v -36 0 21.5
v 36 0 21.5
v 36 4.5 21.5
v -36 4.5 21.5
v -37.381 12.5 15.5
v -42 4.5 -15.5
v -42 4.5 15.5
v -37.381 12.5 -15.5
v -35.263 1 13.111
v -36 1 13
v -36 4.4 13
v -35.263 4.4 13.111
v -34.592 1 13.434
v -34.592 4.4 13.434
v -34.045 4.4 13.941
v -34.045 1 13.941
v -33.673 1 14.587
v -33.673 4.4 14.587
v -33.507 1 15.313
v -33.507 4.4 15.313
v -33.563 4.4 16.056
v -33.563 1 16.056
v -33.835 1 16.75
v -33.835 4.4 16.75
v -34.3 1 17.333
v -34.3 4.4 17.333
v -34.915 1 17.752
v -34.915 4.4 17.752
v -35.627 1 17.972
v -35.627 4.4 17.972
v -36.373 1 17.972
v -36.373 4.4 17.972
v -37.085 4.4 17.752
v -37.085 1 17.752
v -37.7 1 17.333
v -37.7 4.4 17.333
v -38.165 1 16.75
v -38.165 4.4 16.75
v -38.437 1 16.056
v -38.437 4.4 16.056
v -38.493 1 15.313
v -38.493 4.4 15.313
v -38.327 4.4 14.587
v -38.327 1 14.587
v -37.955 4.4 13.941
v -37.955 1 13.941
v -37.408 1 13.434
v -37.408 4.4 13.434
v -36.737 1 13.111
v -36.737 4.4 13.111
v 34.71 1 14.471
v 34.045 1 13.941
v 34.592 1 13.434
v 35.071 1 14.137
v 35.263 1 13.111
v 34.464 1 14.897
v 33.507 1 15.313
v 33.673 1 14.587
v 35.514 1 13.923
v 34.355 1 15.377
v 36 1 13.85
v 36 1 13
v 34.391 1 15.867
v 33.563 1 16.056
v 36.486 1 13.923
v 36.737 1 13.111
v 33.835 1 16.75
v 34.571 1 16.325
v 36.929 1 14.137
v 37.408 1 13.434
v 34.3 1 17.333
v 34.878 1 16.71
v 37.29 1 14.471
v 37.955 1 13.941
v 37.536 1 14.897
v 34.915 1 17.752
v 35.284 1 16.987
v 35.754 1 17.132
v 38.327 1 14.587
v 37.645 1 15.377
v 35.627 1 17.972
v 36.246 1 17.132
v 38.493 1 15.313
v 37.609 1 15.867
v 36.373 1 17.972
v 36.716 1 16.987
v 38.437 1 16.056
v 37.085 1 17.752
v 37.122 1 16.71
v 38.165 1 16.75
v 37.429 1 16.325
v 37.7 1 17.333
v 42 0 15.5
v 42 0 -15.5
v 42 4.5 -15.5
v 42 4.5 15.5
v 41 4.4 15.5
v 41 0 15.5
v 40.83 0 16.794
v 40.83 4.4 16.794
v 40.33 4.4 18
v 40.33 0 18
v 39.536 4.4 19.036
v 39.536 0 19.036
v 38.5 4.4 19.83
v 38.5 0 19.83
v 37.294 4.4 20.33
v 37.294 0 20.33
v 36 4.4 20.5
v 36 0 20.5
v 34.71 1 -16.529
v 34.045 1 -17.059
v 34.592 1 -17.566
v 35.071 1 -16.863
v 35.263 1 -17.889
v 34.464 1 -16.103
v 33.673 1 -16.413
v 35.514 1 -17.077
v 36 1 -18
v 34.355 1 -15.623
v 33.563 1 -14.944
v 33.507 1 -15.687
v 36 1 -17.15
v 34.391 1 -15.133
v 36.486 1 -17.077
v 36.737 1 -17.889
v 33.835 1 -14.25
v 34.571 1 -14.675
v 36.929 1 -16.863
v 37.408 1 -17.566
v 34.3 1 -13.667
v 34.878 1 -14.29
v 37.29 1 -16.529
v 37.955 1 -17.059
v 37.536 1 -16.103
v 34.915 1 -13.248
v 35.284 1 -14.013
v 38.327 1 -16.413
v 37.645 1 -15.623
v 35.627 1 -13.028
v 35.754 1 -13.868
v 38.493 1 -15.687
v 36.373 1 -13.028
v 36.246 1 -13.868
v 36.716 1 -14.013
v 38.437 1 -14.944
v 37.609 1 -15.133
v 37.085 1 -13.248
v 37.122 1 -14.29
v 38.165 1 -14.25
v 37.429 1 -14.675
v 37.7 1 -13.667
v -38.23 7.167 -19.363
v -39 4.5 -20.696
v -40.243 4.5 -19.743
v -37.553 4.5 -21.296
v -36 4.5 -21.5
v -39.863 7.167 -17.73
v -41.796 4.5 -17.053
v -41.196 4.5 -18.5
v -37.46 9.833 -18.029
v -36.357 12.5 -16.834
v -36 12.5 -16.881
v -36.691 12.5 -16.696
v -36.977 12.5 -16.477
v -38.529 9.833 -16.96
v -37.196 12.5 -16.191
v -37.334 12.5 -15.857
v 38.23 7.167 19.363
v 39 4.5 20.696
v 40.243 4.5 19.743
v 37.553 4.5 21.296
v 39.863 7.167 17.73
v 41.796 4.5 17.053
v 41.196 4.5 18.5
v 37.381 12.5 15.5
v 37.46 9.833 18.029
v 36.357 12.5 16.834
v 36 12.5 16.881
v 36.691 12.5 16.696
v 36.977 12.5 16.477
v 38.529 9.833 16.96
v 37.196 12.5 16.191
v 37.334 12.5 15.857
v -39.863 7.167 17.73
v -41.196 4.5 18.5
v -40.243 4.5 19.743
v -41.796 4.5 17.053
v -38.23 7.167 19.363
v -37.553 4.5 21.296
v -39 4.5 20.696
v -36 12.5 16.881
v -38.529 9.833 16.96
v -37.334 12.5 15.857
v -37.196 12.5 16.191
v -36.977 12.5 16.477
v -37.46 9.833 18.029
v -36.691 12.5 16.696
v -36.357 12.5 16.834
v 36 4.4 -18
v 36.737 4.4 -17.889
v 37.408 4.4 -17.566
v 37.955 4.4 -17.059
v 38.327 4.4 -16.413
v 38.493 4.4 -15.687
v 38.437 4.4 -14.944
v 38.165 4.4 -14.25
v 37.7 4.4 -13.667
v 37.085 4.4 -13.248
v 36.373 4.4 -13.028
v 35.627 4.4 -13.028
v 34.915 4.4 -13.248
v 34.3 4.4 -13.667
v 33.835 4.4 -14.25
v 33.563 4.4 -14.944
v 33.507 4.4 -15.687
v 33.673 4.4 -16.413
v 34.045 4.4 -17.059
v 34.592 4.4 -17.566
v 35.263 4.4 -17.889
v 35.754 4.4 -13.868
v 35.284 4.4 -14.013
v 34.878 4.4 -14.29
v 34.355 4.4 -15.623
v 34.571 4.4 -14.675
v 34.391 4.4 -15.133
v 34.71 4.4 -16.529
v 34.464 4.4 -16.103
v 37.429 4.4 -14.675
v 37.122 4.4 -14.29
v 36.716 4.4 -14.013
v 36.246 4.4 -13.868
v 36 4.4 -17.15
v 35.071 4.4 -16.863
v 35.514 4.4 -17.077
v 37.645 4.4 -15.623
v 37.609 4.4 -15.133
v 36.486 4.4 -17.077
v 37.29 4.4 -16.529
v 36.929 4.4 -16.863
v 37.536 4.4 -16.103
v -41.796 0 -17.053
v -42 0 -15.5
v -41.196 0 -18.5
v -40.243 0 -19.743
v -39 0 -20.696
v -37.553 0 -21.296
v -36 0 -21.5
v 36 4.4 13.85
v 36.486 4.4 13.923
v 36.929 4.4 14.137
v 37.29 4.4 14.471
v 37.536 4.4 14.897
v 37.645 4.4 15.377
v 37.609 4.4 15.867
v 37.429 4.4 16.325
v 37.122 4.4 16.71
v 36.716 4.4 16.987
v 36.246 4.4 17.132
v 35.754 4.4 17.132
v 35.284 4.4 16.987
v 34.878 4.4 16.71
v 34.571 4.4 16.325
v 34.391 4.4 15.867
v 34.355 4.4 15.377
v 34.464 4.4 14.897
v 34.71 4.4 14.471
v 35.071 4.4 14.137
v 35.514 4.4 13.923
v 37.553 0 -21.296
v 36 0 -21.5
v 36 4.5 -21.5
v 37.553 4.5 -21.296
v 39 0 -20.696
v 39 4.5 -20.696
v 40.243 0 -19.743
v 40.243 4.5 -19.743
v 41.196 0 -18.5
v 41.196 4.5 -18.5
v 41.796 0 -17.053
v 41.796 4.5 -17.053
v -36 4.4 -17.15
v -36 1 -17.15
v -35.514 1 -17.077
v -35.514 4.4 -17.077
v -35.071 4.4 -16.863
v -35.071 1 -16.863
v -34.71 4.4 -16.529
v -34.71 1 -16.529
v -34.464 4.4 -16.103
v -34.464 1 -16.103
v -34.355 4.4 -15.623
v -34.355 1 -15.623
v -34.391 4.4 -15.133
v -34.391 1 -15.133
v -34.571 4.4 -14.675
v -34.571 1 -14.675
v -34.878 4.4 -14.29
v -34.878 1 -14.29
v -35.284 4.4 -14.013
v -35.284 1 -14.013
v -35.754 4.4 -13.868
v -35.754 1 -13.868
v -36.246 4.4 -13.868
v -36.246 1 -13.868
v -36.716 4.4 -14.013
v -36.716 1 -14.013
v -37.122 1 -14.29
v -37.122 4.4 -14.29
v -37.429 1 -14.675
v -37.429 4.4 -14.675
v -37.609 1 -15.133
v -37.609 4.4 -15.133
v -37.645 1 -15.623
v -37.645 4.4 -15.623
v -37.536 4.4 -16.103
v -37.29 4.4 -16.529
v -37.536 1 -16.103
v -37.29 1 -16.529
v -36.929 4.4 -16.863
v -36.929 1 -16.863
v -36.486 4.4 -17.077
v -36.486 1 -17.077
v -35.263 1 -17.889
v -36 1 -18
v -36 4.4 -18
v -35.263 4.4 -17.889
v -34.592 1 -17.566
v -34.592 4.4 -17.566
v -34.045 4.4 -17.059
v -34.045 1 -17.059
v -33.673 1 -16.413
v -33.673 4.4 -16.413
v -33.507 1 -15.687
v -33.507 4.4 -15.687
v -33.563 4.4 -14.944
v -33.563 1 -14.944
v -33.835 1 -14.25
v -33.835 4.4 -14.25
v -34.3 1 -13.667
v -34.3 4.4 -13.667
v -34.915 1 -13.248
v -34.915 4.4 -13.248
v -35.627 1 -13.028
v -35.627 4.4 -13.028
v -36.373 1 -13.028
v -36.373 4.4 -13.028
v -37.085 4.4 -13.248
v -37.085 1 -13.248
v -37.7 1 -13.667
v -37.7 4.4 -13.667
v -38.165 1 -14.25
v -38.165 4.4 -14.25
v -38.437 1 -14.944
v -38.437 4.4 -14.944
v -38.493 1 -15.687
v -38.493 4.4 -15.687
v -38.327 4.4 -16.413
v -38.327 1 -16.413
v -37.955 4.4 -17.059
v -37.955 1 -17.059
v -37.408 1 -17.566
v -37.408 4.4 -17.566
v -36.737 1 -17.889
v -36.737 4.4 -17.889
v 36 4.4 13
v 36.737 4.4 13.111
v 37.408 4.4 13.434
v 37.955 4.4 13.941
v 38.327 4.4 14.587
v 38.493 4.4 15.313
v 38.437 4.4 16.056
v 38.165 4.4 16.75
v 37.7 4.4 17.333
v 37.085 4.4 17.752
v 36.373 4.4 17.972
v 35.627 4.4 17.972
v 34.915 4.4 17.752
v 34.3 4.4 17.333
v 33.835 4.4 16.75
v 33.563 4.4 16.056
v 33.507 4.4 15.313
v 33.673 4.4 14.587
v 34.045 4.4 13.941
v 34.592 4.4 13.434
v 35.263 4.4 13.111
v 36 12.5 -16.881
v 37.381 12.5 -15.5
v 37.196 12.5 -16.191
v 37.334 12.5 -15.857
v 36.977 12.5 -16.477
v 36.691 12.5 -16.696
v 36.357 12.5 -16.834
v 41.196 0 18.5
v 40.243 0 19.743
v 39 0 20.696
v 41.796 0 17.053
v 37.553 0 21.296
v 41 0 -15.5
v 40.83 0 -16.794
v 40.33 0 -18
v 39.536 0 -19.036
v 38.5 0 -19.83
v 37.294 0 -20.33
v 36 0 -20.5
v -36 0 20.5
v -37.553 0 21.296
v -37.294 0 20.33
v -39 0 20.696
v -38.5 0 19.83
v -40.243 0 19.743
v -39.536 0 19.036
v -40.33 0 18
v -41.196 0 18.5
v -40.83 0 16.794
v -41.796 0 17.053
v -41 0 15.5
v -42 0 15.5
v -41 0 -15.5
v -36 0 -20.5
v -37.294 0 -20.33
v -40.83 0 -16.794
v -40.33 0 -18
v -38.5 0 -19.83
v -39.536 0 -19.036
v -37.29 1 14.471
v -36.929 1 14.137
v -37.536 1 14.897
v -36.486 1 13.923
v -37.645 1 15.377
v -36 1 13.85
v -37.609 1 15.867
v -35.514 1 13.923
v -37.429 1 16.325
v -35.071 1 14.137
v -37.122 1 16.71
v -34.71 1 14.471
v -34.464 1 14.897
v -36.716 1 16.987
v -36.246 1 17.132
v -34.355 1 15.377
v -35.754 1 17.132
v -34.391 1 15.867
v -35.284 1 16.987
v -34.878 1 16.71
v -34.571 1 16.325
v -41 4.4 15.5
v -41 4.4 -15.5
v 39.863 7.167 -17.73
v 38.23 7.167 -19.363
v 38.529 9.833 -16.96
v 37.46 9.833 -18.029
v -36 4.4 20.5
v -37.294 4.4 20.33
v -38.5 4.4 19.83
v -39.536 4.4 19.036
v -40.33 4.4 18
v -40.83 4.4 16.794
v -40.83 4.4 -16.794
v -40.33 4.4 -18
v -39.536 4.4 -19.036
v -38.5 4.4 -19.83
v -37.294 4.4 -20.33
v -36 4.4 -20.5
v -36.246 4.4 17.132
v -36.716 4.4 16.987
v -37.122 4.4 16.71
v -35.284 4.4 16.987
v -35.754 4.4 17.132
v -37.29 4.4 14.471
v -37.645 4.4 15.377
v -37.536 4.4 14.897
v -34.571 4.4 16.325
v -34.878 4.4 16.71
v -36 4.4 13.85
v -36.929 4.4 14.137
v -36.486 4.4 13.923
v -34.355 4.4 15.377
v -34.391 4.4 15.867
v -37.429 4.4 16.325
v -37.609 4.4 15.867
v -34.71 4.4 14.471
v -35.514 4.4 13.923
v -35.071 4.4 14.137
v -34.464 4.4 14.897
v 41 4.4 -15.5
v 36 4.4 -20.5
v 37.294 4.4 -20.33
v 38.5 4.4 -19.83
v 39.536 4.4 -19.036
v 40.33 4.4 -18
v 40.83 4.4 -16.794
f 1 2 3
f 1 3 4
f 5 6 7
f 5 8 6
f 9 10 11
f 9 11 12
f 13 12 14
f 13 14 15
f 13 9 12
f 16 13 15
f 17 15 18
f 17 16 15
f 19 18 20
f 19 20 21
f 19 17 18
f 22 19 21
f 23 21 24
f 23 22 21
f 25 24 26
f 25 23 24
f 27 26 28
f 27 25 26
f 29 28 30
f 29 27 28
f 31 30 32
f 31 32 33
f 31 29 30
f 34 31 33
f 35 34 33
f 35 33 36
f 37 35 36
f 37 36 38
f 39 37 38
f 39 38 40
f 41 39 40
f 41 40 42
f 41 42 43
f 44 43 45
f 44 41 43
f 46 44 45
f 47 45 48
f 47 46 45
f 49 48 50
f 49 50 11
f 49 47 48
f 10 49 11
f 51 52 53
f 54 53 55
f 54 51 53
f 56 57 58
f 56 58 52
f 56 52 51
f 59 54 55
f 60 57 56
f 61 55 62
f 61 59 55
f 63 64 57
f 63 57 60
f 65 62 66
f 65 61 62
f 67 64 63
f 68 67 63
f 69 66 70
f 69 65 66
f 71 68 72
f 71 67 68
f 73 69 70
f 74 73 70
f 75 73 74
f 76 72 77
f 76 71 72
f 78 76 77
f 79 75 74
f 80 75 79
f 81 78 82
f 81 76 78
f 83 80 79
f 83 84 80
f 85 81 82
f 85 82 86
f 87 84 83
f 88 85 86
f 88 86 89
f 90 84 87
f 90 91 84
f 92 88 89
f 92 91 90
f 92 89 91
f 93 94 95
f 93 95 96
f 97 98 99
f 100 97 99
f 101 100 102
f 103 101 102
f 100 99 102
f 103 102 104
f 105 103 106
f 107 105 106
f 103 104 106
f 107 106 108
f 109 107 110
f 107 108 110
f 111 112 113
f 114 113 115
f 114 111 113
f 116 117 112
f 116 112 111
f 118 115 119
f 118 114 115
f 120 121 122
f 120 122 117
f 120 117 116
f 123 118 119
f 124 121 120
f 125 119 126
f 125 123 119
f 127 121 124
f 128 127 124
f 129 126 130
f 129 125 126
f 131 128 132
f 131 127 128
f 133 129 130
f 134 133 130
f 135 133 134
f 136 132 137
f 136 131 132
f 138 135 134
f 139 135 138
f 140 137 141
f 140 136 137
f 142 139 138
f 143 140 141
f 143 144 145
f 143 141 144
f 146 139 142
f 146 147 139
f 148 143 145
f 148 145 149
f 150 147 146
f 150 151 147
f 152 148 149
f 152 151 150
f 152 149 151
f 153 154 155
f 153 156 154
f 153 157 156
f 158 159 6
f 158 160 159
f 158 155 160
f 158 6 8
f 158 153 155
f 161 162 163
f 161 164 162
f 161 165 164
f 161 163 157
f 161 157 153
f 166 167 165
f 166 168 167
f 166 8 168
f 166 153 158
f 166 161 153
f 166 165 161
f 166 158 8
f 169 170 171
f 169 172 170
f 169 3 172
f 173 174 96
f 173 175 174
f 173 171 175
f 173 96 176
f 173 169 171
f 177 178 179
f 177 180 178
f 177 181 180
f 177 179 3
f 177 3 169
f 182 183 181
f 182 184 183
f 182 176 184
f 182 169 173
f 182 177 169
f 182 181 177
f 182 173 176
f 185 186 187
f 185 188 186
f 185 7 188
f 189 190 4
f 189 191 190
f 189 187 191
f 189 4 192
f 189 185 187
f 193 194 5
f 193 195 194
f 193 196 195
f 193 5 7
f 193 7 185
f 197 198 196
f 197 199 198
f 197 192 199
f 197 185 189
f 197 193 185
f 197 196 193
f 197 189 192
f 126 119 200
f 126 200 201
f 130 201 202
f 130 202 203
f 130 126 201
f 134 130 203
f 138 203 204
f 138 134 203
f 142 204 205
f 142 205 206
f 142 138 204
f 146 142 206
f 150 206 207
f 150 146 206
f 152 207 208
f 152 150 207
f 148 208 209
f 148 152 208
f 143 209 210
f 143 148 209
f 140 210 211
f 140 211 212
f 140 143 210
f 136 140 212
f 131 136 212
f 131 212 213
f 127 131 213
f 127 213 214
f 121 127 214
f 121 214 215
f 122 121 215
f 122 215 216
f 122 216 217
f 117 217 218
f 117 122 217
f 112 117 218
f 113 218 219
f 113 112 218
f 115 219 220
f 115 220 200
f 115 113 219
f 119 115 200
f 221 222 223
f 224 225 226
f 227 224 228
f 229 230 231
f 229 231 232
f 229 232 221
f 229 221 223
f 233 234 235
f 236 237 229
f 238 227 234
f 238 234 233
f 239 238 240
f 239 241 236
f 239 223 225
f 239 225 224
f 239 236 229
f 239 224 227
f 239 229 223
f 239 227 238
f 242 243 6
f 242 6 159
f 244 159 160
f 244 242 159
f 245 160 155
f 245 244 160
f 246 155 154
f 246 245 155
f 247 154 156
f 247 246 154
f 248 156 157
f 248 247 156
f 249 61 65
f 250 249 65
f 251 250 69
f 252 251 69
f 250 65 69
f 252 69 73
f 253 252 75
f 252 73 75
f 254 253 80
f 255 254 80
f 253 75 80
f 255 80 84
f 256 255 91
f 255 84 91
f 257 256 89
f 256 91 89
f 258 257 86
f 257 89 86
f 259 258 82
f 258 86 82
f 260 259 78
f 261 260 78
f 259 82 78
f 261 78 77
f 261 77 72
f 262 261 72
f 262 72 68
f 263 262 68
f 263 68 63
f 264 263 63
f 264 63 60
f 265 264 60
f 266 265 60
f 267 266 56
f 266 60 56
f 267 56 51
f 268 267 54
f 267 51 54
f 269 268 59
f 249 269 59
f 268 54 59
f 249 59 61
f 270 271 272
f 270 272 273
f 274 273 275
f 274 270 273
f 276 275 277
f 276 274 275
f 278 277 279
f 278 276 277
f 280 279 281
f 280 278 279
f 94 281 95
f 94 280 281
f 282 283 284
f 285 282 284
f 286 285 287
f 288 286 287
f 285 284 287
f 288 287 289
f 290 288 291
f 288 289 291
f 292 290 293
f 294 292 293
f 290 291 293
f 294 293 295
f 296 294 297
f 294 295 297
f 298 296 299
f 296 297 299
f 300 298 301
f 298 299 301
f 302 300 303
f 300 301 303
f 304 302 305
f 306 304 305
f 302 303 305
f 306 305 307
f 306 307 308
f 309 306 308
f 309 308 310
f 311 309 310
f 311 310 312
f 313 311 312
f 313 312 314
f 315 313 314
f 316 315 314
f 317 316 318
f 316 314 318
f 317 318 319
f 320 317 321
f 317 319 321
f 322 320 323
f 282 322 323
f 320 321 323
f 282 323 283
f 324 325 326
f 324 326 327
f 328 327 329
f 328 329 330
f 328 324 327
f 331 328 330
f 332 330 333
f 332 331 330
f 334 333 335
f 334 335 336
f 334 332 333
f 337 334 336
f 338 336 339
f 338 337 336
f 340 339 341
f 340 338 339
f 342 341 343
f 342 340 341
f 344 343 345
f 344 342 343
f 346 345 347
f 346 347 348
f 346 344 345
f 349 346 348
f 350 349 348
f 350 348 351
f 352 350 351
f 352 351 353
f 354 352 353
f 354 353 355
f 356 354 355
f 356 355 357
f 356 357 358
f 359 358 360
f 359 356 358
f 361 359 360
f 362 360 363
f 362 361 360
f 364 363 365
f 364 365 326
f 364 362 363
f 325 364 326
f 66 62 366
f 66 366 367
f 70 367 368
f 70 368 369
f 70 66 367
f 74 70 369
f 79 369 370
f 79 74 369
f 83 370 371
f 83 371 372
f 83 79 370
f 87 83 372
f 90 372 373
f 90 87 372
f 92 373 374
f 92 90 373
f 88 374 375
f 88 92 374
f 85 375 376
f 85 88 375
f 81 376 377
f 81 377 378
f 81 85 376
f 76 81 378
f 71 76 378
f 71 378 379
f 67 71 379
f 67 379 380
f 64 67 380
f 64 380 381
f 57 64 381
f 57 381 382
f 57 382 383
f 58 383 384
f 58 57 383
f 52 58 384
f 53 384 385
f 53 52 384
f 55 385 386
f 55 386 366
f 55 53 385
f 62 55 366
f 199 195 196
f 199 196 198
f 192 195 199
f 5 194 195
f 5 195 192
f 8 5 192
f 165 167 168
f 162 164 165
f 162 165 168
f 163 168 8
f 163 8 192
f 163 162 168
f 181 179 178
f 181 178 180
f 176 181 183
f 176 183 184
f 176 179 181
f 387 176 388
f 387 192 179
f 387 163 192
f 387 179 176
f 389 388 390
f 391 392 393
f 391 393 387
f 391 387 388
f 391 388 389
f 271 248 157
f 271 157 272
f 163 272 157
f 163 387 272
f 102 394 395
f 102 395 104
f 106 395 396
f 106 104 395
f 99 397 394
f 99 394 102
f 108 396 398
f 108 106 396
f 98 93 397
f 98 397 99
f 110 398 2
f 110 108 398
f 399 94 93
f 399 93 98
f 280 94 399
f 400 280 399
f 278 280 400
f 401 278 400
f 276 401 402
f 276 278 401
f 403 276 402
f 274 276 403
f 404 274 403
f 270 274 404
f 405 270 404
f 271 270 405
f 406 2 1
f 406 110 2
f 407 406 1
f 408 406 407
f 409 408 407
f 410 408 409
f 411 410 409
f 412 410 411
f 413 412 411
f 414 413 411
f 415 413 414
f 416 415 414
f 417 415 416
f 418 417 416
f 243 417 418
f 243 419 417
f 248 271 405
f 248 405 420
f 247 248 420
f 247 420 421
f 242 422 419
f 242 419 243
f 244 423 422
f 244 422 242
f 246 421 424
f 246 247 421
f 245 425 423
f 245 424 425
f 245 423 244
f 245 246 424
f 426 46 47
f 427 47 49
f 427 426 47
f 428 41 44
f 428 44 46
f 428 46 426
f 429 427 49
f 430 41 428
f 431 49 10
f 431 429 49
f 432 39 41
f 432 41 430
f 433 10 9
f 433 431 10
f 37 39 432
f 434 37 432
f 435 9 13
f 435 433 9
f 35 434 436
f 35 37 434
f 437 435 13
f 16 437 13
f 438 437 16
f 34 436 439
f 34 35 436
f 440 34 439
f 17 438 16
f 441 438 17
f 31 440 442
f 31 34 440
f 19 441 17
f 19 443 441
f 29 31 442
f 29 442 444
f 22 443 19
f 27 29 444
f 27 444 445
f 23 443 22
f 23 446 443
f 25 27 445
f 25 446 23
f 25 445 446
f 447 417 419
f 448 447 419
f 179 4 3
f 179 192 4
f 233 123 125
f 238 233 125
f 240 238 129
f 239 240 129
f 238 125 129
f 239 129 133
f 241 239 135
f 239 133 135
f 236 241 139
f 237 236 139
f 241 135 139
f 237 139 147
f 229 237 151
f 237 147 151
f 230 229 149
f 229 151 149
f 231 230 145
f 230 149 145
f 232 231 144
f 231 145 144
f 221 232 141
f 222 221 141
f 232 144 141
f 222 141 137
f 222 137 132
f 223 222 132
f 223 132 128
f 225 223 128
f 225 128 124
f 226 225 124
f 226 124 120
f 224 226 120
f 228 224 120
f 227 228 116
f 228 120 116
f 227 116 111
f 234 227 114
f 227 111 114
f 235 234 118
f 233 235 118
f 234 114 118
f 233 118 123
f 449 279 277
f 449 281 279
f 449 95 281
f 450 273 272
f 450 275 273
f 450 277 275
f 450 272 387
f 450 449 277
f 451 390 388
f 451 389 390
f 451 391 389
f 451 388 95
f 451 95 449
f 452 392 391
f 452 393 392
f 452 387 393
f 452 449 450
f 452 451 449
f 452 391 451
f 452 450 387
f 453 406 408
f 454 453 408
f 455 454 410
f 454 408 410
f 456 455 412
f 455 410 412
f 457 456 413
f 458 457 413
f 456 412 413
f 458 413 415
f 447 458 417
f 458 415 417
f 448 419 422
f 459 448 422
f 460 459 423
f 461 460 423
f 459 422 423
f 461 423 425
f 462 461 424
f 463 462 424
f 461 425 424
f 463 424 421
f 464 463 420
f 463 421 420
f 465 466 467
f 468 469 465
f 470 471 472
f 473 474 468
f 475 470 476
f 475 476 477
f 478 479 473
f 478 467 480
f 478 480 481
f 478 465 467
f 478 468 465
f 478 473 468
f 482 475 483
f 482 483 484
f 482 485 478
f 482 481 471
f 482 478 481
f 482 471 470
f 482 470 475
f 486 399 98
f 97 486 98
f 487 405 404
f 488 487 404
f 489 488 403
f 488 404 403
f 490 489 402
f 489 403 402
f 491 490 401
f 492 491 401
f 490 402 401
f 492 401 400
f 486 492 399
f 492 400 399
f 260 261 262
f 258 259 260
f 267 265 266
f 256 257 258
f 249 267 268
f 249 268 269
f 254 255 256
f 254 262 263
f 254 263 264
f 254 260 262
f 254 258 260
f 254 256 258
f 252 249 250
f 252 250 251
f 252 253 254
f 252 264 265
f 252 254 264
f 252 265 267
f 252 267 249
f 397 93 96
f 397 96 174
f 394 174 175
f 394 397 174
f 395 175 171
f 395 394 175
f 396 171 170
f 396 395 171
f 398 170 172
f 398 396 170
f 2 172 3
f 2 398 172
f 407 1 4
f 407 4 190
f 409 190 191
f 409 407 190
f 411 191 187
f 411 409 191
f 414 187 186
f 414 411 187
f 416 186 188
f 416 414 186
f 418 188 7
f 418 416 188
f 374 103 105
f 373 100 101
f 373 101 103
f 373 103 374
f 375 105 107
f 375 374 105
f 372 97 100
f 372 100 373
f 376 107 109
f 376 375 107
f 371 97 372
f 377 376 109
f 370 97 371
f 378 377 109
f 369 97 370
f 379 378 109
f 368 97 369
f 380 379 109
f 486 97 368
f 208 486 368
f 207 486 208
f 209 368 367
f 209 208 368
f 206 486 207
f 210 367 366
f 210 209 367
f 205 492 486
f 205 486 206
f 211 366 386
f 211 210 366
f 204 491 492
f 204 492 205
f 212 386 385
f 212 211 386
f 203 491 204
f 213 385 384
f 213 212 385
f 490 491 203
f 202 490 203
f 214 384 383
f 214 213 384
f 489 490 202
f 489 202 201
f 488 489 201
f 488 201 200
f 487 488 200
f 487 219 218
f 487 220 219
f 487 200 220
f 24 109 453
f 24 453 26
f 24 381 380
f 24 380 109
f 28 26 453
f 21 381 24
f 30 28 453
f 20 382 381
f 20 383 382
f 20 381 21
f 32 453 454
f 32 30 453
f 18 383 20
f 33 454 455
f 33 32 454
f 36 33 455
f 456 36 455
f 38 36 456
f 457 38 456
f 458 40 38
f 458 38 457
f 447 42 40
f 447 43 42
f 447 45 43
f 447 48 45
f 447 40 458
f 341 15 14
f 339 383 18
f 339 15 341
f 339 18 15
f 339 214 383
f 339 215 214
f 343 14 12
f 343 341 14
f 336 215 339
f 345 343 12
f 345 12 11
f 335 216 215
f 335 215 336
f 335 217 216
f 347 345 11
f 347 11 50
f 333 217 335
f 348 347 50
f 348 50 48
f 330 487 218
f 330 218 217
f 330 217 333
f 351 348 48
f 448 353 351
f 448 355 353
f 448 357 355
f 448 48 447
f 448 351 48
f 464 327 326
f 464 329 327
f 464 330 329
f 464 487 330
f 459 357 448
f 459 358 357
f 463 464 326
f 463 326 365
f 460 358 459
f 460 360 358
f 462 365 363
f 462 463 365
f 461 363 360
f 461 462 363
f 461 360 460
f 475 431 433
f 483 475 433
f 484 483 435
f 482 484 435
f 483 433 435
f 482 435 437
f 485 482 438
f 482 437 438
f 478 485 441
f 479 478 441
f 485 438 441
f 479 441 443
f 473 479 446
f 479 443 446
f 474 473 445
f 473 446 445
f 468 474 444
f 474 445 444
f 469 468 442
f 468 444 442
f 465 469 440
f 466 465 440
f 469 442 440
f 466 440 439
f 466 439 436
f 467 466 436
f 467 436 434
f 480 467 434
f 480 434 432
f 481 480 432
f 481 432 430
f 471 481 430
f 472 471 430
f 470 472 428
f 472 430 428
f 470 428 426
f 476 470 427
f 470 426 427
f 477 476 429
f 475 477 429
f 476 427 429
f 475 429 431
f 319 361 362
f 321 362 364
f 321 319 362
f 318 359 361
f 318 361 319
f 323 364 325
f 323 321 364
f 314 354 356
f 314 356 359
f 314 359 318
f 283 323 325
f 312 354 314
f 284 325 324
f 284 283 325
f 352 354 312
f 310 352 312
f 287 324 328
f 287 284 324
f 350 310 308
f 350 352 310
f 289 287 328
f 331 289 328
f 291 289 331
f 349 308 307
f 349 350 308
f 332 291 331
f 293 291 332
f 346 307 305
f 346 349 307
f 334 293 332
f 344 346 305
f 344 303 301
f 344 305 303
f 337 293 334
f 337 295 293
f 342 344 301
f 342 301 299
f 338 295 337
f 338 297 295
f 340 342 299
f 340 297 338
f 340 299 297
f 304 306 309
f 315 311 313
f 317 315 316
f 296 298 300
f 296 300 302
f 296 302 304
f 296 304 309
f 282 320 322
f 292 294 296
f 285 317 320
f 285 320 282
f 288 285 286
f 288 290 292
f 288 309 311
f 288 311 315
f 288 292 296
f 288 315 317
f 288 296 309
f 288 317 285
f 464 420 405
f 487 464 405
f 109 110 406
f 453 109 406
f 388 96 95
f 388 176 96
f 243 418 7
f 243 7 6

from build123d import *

# Parameters (mm, degrees)
EXTRUDE_1_DEPTH     = 4.5
CUT_EXTRUDE_1_DEPTH = 1
SKETCH_3_R          = 2.5
SKETCH_3_R_2        = 1.65
CUT_EXTRUDE_2_DEPTH = 3.4
EXTRUDE_2_DEPTH     = 8
EXTRUDE_2_TAPER     = 30


with BuildPart() as part:
    # 草图1 → 凸台-拉伸1 (new body)
    with BuildSketch(Plane(origin=(0, 0, 0), x_dir=(1, 0, 0), z_dir=(0, 1, 0))):
        with BuildLine():
            Line((-36, 21.5), (36, 21.5))
            ThreePointArc((36, 21.5), (40.242640687, 19.742640687), (42, 15.5))
            Line((42, 15.5), (42, -15.5))
            ThreePointArc((42, -15.5), (40.242640687, -19.742640687), (36, -21.5))
            Line((36, -21.5), (-36, -21.5))
            ThreePointArc((-36, -21.5), (-40.242640687, -19.742640687), (-42, -15.5))
            Line((-42, -15.5), (-42, 15.5))
            ThreePointArc((-42, 15.5), (-40.242640687, 19.742640687), (-36, 21.5))
        make_face()
    extrude(amount=EXTRUDE_1_DEPTH)

    # 草图2 → 切除-拉伸1 (cut)
    with BuildSketch(Plane.XZ):
        with BuildLine():
            Line((36, 20.5), (-36, 20.5))
            ThreePointArc((-36, 20.5), (-39.535533906, 19.035533906), (-41, 15.5))
            Line((-41, 15.5), (-41, -15.5))
            ThreePointArc((-41, -15.5), (-39.535533906, -19.035533906), (-36, -20.5))
            Line((-36, -20.5), (36, -20.5))
            ThreePointArc((36, -20.5), (39.535533906, -19.035533906), (41, -15.5))
            Line((41, -15.5), (41, 15.5))
            ThreePointArc((41, 15.5), (39.535533906, 19.035533906), (36, 20.5))
        make_face()
    extrude(amount=-CUT_EXTRUDE_1_DEPTH, mode=Mode.SUBTRACT)

    # 草图3 → 切除-拉伸2 (cut)
    # profile 1 of 5: a face of its own
    with BuildSketch(Plane(origin=(0, 1, 0), x_dir=(-1, 0, 0), z_dir=(0, -1, 0))):
        with BuildLine():
            Line((-41, 15.5), (-41, -15.5))
            ThreePointArc((-41, -15.5), (-39.535533906, -19.035533906), (-36, -20.5))
            Line((-36, -20.5), (36, -20.5))
            ThreePointArc((36, -20.5), (39.535533906, -19.035533906), (41, -15.5))
            Line((41, -15.5), (41, 15.5))
            ThreePointArc((41, 15.5), (39.535533906, 19.035533906), (36, 20.5))
            Line((36, 20.5), (-36, 20.5))
            ThreePointArc((-36, 20.5), (-39.535533906, 19.035533906), (-41, 15.5))
        make_face()
        with Locations(Location((36, 15.5, 0), (0, 0, 90))):
            Circle(SKETCH_3_R, mode=Mode.SUBTRACT)
        with Locations(Location((36, -15.5, 0), (0, 0, 90))):
            Circle(SKETCH_3_R, mode=Mode.SUBTRACT)
        with Locations(Location((-36, 15.5, 0), (0, 0, 90))):
            Circle(SKETCH_3_R, mode=Mode.SUBTRACT)
        with Locations(Location((-36, -15.5, 0), (0, 0, 90))):
            Circle(SKETCH_3_R, mode=Mode.SUBTRACT)
    # profile 2 of 5: a face of its own
    with BuildSketch(Plane(origin=(0, 1, 0), x_dir=(-1, 0, 0), z_dir=(0, -1, 0))):
        with Locations(Location((36, 15.5, 0), (0, 0, 90))):
            Circle(SKETCH_3_R_2)
    # profile 3 of 5: a face of its own
    with BuildSketch(Plane(origin=(0, 1, 0), x_dir=(-1, 0, 0), z_dir=(0, -1, 0))):
        with Locations(Location((36, -15.5, 0), (0, 0, 90))):
            Circle(SKETCH_3_R_2)
    # profile 4 of 5: a face of its own
    with BuildSketch(Plane(origin=(0, 1, 0), x_dir=(-1, 0, 0), z_dir=(0, -1, 0))):
        with Locations(Location((-36, -15.5, 0), (0, 0, 90))):
            Circle(SKETCH_3_R_2)
    # profile 5 of 5: a face of its own
    with BuildSketch(Plane(origin=(0, 1, 0), x_dir=(-1, 0, 0), z_dir=(0, -1, 0))):
        with Locations(Location((-36, 15.5, 0), (0, 0, 90))):
            Circle(SKETCH_3_R_2)
    extrude(amount=-CUT_EXTRUDE_2_DEPTH, mode=Mode.SUBTRACT)

    # 草图5 → 凸台-拉伸2 (add)
    with BuildSketch(Plane(origin=(0, 4.5, 0), x_dir=(1, 0, 0), z_dir=(0, 1, 0))):
        with BuildLine():
            Line((42, -15.5), (42, 15.5))
            ThreePointArc((42, 15.5), (40.242640687, 19.742640687), (36, 21.5))
            Line((36, 21.5), (-36, 21.5))
            ThreePointArc((-36, 21.5), (-40.242640687, 19.742640687), (-42, 15.5))
            Line((-42, 15.5), (-42, -15.5))
            ThreePointArc((-42, -15.5), (-40.242640687, -19.742640687), (-36, -21.5))
            Line((-36, -21.5), (36, -21.5))
            ThreePointArc((36, -21.5), (40.242640687, -19.742640687), (42, -15.5))
        make_face()
    extrude(amount=EXTRUDE_2_DEPTH, taper=EXTRUDE_2_TAPER)


solid = part.part
